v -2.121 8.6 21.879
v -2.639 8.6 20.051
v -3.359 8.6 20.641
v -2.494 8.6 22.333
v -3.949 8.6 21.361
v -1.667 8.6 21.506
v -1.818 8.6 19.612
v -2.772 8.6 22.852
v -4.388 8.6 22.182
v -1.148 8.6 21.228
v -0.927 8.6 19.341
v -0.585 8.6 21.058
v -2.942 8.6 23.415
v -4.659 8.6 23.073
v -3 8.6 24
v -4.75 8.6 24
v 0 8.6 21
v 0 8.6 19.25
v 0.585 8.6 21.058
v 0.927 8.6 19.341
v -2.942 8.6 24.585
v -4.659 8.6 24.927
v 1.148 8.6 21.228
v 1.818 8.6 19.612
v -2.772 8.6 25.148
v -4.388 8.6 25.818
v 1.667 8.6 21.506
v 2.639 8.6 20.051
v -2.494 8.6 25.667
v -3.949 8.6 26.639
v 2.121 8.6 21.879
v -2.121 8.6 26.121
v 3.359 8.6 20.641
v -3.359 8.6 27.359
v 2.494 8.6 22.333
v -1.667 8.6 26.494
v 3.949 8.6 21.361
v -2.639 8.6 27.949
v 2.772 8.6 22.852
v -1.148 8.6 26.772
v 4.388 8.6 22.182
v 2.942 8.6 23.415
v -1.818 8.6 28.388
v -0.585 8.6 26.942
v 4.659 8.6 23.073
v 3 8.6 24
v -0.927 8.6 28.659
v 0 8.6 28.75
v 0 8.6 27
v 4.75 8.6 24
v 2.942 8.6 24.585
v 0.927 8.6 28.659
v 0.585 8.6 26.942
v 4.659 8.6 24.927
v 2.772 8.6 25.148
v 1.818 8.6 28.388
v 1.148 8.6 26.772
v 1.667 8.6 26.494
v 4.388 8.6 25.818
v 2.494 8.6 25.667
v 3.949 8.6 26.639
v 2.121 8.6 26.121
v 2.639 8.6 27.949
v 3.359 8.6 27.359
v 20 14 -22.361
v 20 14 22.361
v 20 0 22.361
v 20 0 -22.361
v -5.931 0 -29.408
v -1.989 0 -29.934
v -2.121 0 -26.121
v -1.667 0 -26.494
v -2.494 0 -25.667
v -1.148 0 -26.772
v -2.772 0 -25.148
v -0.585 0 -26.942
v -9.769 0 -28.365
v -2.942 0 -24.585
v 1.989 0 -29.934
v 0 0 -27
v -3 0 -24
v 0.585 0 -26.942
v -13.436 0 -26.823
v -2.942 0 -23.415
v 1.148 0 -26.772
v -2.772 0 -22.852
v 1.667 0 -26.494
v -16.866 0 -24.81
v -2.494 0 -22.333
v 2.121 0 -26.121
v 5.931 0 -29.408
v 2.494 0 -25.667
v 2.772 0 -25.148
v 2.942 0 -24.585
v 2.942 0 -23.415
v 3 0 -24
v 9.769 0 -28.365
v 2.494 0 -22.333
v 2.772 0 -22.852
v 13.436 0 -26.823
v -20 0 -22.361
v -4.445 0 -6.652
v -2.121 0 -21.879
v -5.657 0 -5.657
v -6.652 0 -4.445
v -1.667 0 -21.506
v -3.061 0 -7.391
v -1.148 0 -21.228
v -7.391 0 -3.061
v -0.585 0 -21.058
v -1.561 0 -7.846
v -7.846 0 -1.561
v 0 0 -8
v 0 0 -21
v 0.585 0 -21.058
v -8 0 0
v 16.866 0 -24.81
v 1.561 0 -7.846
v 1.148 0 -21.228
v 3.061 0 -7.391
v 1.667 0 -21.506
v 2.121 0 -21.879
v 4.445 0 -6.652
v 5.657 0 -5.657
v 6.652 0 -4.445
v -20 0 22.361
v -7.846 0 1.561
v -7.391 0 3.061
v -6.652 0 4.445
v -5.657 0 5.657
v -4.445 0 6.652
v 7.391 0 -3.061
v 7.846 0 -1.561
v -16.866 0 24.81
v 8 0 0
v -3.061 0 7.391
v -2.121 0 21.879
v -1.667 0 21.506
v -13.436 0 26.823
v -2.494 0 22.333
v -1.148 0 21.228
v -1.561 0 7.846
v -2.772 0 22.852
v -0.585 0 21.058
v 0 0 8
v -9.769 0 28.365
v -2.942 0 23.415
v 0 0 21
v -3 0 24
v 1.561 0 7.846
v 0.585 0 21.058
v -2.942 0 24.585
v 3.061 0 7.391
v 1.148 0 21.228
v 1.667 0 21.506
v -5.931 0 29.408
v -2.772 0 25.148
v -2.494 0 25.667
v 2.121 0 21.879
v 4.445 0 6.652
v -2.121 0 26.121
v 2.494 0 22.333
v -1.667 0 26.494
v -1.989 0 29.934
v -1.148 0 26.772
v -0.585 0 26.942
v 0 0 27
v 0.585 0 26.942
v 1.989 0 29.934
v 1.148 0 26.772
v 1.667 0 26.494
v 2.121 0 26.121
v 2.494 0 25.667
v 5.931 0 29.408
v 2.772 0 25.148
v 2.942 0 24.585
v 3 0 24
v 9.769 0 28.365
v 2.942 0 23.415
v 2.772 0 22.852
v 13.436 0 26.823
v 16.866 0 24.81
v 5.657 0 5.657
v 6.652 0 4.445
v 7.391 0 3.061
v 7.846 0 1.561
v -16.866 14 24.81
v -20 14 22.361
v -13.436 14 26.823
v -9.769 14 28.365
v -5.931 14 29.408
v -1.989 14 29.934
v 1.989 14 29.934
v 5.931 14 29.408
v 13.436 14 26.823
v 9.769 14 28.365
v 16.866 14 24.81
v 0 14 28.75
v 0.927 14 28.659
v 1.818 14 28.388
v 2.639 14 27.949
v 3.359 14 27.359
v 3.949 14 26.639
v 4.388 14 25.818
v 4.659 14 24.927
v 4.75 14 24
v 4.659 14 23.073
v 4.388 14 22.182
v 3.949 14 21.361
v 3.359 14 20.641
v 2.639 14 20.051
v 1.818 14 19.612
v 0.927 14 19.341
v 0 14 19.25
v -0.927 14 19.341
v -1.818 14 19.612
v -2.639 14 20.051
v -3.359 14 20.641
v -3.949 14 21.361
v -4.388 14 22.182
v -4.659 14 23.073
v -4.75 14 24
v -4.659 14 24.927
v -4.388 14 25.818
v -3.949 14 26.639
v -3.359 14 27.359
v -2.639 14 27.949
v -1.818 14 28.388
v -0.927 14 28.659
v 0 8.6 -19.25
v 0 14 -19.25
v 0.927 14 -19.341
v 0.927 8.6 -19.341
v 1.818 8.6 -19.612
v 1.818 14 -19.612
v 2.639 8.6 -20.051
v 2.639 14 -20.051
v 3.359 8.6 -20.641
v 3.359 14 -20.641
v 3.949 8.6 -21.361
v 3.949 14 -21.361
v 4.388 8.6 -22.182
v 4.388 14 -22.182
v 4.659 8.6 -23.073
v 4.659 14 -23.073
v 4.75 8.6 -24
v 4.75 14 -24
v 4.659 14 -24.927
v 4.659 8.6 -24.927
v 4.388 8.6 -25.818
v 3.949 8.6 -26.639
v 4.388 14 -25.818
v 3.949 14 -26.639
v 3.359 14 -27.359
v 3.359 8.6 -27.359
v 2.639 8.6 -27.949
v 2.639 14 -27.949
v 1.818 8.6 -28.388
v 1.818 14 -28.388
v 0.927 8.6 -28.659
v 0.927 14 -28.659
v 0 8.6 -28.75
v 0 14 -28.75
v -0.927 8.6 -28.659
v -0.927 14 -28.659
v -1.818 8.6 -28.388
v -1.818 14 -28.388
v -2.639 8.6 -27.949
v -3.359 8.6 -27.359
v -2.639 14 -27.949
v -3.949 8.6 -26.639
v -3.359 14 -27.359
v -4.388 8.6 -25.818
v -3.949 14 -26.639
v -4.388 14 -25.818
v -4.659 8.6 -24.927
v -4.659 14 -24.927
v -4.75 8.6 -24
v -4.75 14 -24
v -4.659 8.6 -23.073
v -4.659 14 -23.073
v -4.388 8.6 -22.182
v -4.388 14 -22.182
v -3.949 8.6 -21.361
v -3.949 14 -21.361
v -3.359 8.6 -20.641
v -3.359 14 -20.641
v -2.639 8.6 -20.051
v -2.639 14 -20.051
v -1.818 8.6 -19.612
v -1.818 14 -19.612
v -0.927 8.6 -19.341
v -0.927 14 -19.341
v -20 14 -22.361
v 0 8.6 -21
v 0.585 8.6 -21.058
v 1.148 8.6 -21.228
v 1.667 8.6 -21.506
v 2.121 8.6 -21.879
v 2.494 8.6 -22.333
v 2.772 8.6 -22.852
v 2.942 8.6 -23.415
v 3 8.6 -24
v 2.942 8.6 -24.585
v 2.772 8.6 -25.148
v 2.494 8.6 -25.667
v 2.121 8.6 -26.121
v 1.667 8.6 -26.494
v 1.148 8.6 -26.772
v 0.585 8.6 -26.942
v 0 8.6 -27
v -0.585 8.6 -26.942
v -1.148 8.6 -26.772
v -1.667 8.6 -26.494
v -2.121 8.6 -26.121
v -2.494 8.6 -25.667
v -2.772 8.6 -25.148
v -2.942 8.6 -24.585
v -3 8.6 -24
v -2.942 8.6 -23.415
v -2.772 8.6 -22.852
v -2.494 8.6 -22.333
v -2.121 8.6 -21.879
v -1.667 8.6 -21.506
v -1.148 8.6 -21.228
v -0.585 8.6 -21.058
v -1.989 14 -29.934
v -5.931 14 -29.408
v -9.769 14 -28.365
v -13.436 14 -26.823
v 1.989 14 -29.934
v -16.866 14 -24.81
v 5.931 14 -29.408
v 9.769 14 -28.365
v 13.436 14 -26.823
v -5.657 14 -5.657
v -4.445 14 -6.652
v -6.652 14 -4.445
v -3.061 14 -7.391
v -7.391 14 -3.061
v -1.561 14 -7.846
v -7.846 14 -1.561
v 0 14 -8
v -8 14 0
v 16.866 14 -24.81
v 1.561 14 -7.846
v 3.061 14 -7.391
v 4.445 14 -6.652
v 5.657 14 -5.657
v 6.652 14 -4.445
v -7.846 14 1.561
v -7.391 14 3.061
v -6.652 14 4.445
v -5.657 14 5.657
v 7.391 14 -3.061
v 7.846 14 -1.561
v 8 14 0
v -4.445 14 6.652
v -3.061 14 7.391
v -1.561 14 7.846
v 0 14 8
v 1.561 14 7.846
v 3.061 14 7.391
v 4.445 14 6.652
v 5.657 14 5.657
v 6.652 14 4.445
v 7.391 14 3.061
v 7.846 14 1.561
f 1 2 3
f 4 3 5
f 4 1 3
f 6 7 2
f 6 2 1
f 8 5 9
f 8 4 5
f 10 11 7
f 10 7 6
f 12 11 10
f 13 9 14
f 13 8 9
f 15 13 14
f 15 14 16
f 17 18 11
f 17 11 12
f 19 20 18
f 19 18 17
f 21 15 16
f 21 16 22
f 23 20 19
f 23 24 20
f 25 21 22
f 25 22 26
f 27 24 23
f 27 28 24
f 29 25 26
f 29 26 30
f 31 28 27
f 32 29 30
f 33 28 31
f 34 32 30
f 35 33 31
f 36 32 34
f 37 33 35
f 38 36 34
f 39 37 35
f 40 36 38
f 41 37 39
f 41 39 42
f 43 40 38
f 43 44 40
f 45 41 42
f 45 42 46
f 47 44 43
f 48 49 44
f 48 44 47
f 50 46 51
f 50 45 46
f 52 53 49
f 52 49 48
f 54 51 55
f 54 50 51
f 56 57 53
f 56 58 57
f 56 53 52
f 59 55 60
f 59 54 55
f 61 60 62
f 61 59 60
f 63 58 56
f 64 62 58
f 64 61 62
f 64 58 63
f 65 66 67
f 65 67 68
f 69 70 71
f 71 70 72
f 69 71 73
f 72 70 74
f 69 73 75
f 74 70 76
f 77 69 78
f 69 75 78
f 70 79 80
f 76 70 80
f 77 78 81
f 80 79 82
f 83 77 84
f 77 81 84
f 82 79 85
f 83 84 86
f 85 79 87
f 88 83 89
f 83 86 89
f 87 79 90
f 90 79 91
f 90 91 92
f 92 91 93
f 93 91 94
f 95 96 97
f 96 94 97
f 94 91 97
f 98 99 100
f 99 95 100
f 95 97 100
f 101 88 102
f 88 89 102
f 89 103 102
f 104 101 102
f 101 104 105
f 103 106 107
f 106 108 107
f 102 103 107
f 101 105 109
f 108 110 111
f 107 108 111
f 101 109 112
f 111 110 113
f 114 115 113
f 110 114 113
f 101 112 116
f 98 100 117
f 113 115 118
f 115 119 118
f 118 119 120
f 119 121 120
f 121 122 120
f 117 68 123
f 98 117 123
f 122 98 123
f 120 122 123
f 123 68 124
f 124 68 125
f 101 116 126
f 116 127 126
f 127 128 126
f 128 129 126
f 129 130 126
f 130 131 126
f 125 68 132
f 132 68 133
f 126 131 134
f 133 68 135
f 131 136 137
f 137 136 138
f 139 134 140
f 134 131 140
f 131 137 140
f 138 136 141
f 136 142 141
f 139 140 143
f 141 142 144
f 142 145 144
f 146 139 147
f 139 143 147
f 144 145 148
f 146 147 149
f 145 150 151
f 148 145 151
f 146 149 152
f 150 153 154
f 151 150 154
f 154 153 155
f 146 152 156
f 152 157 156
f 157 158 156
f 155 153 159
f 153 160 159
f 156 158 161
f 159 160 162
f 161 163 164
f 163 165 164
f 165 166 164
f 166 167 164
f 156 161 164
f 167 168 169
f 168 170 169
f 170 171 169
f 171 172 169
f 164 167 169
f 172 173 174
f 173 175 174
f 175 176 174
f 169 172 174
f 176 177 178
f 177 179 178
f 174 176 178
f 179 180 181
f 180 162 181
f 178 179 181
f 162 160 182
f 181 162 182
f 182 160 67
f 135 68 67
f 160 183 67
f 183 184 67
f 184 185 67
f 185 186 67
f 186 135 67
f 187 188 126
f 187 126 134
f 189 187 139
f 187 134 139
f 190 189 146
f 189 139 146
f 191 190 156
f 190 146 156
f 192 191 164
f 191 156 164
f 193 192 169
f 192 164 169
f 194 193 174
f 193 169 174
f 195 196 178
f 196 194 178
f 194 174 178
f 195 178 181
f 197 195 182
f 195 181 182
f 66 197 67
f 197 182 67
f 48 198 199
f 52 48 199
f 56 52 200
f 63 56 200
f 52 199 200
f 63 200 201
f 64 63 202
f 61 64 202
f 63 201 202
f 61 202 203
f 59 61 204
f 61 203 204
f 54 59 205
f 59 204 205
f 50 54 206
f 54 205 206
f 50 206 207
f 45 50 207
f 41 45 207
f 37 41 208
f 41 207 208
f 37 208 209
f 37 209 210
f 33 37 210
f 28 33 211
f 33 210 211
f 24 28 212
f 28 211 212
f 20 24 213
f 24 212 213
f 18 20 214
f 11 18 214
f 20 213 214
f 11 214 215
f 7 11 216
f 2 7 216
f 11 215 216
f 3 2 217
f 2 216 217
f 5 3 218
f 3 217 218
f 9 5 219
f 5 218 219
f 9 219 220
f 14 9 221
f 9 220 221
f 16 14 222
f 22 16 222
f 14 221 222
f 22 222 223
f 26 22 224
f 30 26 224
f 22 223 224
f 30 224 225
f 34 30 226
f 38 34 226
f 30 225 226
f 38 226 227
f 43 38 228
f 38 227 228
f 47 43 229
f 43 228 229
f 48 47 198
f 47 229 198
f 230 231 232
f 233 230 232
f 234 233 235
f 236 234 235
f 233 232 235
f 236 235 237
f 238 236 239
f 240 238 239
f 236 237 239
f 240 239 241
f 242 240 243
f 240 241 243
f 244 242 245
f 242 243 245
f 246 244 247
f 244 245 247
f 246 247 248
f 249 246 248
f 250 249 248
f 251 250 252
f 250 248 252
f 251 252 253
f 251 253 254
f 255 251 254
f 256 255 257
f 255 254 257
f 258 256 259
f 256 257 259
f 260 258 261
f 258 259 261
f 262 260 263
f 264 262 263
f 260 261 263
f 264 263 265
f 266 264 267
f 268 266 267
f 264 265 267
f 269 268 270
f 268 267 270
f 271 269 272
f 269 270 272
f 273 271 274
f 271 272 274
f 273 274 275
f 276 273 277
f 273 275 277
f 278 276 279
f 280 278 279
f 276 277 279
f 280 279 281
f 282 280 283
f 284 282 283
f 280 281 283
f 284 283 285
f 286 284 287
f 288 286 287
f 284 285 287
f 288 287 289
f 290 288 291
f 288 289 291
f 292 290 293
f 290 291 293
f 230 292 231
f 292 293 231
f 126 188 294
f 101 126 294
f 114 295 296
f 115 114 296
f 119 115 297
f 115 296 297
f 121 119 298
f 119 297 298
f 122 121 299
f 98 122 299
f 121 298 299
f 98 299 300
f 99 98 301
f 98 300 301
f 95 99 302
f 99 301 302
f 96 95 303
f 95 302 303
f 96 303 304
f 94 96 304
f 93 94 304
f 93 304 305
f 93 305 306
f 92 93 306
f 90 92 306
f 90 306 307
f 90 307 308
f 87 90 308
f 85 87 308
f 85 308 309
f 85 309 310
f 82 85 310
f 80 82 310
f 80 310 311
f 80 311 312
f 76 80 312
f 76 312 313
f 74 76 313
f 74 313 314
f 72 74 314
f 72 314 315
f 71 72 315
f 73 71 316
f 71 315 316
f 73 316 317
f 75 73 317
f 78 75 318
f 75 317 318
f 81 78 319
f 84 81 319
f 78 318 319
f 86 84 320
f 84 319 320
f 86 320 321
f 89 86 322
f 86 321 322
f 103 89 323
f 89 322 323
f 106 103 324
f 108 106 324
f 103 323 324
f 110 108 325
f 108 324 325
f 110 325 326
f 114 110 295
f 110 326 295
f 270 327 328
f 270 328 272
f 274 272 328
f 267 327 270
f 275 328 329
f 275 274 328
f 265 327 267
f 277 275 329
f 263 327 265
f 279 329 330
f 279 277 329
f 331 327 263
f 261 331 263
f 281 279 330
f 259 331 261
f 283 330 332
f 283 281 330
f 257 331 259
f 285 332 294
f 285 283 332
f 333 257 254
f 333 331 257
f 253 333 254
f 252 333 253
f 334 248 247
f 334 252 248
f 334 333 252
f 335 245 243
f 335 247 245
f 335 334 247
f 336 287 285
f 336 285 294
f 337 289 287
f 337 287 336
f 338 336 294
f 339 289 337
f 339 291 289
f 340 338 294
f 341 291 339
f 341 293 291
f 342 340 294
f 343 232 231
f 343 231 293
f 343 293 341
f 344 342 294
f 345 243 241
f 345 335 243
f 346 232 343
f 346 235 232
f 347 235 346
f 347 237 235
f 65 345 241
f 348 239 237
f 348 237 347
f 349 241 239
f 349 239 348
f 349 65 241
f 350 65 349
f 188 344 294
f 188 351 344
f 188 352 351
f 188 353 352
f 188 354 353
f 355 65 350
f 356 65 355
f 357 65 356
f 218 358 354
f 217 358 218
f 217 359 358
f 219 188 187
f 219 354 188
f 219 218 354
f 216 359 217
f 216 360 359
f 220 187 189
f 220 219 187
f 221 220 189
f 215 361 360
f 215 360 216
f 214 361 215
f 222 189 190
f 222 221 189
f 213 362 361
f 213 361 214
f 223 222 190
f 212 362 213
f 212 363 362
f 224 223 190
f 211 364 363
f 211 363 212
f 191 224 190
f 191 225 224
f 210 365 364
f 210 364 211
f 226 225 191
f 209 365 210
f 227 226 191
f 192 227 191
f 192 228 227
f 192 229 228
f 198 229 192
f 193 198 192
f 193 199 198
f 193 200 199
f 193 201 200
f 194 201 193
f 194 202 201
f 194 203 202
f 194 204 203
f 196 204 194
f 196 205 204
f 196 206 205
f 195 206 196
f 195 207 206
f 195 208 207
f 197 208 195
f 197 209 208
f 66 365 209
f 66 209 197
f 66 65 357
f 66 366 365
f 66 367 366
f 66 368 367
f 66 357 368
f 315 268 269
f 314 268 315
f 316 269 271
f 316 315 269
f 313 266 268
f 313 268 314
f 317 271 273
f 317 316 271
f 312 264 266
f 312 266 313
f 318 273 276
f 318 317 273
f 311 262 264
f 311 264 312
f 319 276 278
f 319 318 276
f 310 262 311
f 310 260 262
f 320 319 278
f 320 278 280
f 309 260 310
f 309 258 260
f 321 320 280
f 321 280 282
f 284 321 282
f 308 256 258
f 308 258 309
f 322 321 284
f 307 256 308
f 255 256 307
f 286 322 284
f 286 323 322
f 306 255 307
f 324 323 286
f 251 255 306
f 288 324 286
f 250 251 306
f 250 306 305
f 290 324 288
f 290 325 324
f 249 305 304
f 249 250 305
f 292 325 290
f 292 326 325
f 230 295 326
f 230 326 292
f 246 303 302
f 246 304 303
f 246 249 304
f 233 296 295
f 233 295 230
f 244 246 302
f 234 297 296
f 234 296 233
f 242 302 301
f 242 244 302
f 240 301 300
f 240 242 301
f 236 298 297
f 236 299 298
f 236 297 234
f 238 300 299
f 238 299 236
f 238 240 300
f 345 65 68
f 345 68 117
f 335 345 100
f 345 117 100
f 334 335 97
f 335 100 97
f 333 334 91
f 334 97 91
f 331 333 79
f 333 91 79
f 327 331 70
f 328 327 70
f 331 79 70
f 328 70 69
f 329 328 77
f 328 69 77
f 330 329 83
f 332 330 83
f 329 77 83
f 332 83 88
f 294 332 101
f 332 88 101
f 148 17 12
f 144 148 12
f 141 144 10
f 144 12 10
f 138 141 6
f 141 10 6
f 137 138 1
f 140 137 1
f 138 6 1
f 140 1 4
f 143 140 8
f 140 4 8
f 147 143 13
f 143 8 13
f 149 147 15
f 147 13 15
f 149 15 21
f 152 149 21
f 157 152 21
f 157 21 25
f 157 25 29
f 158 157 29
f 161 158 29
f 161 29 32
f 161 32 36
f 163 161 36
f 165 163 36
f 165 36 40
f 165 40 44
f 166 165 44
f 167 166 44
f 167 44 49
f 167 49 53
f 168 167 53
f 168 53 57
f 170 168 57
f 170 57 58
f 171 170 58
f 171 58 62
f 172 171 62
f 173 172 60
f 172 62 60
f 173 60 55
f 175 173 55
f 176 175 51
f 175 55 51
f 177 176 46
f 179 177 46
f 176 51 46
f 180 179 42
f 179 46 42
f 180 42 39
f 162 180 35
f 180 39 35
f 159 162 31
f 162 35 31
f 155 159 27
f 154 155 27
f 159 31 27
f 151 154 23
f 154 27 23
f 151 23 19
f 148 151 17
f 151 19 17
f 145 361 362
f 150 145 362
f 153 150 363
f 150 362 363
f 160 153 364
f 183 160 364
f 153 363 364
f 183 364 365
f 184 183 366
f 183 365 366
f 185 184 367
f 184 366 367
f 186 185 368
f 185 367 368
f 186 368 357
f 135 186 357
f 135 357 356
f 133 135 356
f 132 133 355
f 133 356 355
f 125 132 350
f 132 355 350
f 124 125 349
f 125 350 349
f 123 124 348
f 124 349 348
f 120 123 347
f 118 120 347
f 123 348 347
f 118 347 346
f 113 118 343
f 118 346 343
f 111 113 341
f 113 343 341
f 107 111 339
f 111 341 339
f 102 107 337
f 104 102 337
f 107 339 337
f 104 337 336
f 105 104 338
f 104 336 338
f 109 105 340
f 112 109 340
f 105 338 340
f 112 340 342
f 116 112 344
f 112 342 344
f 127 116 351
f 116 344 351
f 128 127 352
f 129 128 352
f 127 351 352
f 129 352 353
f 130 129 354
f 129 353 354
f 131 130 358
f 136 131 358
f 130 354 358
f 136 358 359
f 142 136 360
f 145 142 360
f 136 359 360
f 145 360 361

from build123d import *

# Parameters (mm, degrees)
SKETCH_1_R           = 30
EXTRUDE_1_DEPTH      = 14
SKETCH_2_R           = 8
CUT_EXTRUDE_1_DEPTH  = 14
SKETCH_3_R           = 3
CUT_EXTRUDE_2_DEPTH  = 14
SKETCH_4_R           = 4.75
CUT_EXTRUDE_3_DEPTH  = 5.4
SKETCH_5_OUTSIDE_W   = 79.2
SKETCH_5_OUTSIDE_H   = 79.2
SKETCH_5_OUTSIDE_W_2 = 40
SKETCH_5_OUTSIDE_H_2 = 65
CUT_EXTRUDE_4_DEPTH  = 14


with BuildPart() as part:
    # 草图1 → 凸台-拉伸1 (new body)
    with BuildSketch(Plane(origin=(0, 0, 0), x_dir=(1, 0, 0), z_dir=(0, 1, 0))):
        with Locations(Location((0, 0, 0), (0, 0, 270))):
            Circle(SKETCH_1_R)
    extrude(amount=EXTRUDE_1_DEPTH)

    # 草图2 → 切除-拉伸1 (cut)
    with BuildSketch(Plane(origin=(0, 14, 0), x_dir=(1, 0, 0), z_dir=(0, 1, 0))):
        with Locations(Location((0, 0, 0), (0, 0, 270))):
            Circle(SKETCH_2_R)
    extrude(amount=-CUT_EXTRUDE_1_DEPTH, mode=Mode.SUBTRACT)

    # 草图3 → 切除-拉伸2 (cut)
    with BuildSketch(Plane(origin=(0, 14, 0), x_dir=(1, 0, 0), z_dir=(0, 1, 0))):
        with Locations(Location((0, 24, 0), (0, 0, 270))):
            Circle(SKETCH_3_R)
        with Locations(Location((0, -24, 0), (0, 0, 90))):
            Circle(SKETCH_3_R)
    extrude(amount=-CUT_EXTRUDE_2_DEPTH, mode=Mode.SUBTRACT)

    # 草图4 → 切除-拉伸3 (cut)
    with BuildSketch(Plane(origin=(0, 14, 0), x_dir=(1, 0, 0), z_dir=(0, 1, 0))):
        with Locations(Location((0, 24, 0), (0, 0, 270))):
            Circle(SKETCH_4_R)
        with Locations(Location((0, -24, 0), (0, 0, 270))):
            Circle(SKETCH_4_R)
    extrude(amount=-CUT_EXTRUDE_3_DEPTH, mode=Mode.SUBTRACT)

    # 草图5 outside → 切除-拉伸4 (cut)
    with BuildSketch(Plane(origin=(0, 14, 0), x_dir=(1, 0, 0), z_dir=(0, 1, 0))):
        Rectangle(SKETCH_5_OUTSIDE_W, SKETCH_5_OUTSIDE_H)
        Rectangle(SKETCH_5_OUTSIDE_W_2, SKETCH_5_OUTSIDE_H_2, mode=Mode.SUBTRACT)
    extrude(amount=-CUT_EXTRUDE_4_DEPTH, mode=Mode.SUBTRACT)


solid = part.part
